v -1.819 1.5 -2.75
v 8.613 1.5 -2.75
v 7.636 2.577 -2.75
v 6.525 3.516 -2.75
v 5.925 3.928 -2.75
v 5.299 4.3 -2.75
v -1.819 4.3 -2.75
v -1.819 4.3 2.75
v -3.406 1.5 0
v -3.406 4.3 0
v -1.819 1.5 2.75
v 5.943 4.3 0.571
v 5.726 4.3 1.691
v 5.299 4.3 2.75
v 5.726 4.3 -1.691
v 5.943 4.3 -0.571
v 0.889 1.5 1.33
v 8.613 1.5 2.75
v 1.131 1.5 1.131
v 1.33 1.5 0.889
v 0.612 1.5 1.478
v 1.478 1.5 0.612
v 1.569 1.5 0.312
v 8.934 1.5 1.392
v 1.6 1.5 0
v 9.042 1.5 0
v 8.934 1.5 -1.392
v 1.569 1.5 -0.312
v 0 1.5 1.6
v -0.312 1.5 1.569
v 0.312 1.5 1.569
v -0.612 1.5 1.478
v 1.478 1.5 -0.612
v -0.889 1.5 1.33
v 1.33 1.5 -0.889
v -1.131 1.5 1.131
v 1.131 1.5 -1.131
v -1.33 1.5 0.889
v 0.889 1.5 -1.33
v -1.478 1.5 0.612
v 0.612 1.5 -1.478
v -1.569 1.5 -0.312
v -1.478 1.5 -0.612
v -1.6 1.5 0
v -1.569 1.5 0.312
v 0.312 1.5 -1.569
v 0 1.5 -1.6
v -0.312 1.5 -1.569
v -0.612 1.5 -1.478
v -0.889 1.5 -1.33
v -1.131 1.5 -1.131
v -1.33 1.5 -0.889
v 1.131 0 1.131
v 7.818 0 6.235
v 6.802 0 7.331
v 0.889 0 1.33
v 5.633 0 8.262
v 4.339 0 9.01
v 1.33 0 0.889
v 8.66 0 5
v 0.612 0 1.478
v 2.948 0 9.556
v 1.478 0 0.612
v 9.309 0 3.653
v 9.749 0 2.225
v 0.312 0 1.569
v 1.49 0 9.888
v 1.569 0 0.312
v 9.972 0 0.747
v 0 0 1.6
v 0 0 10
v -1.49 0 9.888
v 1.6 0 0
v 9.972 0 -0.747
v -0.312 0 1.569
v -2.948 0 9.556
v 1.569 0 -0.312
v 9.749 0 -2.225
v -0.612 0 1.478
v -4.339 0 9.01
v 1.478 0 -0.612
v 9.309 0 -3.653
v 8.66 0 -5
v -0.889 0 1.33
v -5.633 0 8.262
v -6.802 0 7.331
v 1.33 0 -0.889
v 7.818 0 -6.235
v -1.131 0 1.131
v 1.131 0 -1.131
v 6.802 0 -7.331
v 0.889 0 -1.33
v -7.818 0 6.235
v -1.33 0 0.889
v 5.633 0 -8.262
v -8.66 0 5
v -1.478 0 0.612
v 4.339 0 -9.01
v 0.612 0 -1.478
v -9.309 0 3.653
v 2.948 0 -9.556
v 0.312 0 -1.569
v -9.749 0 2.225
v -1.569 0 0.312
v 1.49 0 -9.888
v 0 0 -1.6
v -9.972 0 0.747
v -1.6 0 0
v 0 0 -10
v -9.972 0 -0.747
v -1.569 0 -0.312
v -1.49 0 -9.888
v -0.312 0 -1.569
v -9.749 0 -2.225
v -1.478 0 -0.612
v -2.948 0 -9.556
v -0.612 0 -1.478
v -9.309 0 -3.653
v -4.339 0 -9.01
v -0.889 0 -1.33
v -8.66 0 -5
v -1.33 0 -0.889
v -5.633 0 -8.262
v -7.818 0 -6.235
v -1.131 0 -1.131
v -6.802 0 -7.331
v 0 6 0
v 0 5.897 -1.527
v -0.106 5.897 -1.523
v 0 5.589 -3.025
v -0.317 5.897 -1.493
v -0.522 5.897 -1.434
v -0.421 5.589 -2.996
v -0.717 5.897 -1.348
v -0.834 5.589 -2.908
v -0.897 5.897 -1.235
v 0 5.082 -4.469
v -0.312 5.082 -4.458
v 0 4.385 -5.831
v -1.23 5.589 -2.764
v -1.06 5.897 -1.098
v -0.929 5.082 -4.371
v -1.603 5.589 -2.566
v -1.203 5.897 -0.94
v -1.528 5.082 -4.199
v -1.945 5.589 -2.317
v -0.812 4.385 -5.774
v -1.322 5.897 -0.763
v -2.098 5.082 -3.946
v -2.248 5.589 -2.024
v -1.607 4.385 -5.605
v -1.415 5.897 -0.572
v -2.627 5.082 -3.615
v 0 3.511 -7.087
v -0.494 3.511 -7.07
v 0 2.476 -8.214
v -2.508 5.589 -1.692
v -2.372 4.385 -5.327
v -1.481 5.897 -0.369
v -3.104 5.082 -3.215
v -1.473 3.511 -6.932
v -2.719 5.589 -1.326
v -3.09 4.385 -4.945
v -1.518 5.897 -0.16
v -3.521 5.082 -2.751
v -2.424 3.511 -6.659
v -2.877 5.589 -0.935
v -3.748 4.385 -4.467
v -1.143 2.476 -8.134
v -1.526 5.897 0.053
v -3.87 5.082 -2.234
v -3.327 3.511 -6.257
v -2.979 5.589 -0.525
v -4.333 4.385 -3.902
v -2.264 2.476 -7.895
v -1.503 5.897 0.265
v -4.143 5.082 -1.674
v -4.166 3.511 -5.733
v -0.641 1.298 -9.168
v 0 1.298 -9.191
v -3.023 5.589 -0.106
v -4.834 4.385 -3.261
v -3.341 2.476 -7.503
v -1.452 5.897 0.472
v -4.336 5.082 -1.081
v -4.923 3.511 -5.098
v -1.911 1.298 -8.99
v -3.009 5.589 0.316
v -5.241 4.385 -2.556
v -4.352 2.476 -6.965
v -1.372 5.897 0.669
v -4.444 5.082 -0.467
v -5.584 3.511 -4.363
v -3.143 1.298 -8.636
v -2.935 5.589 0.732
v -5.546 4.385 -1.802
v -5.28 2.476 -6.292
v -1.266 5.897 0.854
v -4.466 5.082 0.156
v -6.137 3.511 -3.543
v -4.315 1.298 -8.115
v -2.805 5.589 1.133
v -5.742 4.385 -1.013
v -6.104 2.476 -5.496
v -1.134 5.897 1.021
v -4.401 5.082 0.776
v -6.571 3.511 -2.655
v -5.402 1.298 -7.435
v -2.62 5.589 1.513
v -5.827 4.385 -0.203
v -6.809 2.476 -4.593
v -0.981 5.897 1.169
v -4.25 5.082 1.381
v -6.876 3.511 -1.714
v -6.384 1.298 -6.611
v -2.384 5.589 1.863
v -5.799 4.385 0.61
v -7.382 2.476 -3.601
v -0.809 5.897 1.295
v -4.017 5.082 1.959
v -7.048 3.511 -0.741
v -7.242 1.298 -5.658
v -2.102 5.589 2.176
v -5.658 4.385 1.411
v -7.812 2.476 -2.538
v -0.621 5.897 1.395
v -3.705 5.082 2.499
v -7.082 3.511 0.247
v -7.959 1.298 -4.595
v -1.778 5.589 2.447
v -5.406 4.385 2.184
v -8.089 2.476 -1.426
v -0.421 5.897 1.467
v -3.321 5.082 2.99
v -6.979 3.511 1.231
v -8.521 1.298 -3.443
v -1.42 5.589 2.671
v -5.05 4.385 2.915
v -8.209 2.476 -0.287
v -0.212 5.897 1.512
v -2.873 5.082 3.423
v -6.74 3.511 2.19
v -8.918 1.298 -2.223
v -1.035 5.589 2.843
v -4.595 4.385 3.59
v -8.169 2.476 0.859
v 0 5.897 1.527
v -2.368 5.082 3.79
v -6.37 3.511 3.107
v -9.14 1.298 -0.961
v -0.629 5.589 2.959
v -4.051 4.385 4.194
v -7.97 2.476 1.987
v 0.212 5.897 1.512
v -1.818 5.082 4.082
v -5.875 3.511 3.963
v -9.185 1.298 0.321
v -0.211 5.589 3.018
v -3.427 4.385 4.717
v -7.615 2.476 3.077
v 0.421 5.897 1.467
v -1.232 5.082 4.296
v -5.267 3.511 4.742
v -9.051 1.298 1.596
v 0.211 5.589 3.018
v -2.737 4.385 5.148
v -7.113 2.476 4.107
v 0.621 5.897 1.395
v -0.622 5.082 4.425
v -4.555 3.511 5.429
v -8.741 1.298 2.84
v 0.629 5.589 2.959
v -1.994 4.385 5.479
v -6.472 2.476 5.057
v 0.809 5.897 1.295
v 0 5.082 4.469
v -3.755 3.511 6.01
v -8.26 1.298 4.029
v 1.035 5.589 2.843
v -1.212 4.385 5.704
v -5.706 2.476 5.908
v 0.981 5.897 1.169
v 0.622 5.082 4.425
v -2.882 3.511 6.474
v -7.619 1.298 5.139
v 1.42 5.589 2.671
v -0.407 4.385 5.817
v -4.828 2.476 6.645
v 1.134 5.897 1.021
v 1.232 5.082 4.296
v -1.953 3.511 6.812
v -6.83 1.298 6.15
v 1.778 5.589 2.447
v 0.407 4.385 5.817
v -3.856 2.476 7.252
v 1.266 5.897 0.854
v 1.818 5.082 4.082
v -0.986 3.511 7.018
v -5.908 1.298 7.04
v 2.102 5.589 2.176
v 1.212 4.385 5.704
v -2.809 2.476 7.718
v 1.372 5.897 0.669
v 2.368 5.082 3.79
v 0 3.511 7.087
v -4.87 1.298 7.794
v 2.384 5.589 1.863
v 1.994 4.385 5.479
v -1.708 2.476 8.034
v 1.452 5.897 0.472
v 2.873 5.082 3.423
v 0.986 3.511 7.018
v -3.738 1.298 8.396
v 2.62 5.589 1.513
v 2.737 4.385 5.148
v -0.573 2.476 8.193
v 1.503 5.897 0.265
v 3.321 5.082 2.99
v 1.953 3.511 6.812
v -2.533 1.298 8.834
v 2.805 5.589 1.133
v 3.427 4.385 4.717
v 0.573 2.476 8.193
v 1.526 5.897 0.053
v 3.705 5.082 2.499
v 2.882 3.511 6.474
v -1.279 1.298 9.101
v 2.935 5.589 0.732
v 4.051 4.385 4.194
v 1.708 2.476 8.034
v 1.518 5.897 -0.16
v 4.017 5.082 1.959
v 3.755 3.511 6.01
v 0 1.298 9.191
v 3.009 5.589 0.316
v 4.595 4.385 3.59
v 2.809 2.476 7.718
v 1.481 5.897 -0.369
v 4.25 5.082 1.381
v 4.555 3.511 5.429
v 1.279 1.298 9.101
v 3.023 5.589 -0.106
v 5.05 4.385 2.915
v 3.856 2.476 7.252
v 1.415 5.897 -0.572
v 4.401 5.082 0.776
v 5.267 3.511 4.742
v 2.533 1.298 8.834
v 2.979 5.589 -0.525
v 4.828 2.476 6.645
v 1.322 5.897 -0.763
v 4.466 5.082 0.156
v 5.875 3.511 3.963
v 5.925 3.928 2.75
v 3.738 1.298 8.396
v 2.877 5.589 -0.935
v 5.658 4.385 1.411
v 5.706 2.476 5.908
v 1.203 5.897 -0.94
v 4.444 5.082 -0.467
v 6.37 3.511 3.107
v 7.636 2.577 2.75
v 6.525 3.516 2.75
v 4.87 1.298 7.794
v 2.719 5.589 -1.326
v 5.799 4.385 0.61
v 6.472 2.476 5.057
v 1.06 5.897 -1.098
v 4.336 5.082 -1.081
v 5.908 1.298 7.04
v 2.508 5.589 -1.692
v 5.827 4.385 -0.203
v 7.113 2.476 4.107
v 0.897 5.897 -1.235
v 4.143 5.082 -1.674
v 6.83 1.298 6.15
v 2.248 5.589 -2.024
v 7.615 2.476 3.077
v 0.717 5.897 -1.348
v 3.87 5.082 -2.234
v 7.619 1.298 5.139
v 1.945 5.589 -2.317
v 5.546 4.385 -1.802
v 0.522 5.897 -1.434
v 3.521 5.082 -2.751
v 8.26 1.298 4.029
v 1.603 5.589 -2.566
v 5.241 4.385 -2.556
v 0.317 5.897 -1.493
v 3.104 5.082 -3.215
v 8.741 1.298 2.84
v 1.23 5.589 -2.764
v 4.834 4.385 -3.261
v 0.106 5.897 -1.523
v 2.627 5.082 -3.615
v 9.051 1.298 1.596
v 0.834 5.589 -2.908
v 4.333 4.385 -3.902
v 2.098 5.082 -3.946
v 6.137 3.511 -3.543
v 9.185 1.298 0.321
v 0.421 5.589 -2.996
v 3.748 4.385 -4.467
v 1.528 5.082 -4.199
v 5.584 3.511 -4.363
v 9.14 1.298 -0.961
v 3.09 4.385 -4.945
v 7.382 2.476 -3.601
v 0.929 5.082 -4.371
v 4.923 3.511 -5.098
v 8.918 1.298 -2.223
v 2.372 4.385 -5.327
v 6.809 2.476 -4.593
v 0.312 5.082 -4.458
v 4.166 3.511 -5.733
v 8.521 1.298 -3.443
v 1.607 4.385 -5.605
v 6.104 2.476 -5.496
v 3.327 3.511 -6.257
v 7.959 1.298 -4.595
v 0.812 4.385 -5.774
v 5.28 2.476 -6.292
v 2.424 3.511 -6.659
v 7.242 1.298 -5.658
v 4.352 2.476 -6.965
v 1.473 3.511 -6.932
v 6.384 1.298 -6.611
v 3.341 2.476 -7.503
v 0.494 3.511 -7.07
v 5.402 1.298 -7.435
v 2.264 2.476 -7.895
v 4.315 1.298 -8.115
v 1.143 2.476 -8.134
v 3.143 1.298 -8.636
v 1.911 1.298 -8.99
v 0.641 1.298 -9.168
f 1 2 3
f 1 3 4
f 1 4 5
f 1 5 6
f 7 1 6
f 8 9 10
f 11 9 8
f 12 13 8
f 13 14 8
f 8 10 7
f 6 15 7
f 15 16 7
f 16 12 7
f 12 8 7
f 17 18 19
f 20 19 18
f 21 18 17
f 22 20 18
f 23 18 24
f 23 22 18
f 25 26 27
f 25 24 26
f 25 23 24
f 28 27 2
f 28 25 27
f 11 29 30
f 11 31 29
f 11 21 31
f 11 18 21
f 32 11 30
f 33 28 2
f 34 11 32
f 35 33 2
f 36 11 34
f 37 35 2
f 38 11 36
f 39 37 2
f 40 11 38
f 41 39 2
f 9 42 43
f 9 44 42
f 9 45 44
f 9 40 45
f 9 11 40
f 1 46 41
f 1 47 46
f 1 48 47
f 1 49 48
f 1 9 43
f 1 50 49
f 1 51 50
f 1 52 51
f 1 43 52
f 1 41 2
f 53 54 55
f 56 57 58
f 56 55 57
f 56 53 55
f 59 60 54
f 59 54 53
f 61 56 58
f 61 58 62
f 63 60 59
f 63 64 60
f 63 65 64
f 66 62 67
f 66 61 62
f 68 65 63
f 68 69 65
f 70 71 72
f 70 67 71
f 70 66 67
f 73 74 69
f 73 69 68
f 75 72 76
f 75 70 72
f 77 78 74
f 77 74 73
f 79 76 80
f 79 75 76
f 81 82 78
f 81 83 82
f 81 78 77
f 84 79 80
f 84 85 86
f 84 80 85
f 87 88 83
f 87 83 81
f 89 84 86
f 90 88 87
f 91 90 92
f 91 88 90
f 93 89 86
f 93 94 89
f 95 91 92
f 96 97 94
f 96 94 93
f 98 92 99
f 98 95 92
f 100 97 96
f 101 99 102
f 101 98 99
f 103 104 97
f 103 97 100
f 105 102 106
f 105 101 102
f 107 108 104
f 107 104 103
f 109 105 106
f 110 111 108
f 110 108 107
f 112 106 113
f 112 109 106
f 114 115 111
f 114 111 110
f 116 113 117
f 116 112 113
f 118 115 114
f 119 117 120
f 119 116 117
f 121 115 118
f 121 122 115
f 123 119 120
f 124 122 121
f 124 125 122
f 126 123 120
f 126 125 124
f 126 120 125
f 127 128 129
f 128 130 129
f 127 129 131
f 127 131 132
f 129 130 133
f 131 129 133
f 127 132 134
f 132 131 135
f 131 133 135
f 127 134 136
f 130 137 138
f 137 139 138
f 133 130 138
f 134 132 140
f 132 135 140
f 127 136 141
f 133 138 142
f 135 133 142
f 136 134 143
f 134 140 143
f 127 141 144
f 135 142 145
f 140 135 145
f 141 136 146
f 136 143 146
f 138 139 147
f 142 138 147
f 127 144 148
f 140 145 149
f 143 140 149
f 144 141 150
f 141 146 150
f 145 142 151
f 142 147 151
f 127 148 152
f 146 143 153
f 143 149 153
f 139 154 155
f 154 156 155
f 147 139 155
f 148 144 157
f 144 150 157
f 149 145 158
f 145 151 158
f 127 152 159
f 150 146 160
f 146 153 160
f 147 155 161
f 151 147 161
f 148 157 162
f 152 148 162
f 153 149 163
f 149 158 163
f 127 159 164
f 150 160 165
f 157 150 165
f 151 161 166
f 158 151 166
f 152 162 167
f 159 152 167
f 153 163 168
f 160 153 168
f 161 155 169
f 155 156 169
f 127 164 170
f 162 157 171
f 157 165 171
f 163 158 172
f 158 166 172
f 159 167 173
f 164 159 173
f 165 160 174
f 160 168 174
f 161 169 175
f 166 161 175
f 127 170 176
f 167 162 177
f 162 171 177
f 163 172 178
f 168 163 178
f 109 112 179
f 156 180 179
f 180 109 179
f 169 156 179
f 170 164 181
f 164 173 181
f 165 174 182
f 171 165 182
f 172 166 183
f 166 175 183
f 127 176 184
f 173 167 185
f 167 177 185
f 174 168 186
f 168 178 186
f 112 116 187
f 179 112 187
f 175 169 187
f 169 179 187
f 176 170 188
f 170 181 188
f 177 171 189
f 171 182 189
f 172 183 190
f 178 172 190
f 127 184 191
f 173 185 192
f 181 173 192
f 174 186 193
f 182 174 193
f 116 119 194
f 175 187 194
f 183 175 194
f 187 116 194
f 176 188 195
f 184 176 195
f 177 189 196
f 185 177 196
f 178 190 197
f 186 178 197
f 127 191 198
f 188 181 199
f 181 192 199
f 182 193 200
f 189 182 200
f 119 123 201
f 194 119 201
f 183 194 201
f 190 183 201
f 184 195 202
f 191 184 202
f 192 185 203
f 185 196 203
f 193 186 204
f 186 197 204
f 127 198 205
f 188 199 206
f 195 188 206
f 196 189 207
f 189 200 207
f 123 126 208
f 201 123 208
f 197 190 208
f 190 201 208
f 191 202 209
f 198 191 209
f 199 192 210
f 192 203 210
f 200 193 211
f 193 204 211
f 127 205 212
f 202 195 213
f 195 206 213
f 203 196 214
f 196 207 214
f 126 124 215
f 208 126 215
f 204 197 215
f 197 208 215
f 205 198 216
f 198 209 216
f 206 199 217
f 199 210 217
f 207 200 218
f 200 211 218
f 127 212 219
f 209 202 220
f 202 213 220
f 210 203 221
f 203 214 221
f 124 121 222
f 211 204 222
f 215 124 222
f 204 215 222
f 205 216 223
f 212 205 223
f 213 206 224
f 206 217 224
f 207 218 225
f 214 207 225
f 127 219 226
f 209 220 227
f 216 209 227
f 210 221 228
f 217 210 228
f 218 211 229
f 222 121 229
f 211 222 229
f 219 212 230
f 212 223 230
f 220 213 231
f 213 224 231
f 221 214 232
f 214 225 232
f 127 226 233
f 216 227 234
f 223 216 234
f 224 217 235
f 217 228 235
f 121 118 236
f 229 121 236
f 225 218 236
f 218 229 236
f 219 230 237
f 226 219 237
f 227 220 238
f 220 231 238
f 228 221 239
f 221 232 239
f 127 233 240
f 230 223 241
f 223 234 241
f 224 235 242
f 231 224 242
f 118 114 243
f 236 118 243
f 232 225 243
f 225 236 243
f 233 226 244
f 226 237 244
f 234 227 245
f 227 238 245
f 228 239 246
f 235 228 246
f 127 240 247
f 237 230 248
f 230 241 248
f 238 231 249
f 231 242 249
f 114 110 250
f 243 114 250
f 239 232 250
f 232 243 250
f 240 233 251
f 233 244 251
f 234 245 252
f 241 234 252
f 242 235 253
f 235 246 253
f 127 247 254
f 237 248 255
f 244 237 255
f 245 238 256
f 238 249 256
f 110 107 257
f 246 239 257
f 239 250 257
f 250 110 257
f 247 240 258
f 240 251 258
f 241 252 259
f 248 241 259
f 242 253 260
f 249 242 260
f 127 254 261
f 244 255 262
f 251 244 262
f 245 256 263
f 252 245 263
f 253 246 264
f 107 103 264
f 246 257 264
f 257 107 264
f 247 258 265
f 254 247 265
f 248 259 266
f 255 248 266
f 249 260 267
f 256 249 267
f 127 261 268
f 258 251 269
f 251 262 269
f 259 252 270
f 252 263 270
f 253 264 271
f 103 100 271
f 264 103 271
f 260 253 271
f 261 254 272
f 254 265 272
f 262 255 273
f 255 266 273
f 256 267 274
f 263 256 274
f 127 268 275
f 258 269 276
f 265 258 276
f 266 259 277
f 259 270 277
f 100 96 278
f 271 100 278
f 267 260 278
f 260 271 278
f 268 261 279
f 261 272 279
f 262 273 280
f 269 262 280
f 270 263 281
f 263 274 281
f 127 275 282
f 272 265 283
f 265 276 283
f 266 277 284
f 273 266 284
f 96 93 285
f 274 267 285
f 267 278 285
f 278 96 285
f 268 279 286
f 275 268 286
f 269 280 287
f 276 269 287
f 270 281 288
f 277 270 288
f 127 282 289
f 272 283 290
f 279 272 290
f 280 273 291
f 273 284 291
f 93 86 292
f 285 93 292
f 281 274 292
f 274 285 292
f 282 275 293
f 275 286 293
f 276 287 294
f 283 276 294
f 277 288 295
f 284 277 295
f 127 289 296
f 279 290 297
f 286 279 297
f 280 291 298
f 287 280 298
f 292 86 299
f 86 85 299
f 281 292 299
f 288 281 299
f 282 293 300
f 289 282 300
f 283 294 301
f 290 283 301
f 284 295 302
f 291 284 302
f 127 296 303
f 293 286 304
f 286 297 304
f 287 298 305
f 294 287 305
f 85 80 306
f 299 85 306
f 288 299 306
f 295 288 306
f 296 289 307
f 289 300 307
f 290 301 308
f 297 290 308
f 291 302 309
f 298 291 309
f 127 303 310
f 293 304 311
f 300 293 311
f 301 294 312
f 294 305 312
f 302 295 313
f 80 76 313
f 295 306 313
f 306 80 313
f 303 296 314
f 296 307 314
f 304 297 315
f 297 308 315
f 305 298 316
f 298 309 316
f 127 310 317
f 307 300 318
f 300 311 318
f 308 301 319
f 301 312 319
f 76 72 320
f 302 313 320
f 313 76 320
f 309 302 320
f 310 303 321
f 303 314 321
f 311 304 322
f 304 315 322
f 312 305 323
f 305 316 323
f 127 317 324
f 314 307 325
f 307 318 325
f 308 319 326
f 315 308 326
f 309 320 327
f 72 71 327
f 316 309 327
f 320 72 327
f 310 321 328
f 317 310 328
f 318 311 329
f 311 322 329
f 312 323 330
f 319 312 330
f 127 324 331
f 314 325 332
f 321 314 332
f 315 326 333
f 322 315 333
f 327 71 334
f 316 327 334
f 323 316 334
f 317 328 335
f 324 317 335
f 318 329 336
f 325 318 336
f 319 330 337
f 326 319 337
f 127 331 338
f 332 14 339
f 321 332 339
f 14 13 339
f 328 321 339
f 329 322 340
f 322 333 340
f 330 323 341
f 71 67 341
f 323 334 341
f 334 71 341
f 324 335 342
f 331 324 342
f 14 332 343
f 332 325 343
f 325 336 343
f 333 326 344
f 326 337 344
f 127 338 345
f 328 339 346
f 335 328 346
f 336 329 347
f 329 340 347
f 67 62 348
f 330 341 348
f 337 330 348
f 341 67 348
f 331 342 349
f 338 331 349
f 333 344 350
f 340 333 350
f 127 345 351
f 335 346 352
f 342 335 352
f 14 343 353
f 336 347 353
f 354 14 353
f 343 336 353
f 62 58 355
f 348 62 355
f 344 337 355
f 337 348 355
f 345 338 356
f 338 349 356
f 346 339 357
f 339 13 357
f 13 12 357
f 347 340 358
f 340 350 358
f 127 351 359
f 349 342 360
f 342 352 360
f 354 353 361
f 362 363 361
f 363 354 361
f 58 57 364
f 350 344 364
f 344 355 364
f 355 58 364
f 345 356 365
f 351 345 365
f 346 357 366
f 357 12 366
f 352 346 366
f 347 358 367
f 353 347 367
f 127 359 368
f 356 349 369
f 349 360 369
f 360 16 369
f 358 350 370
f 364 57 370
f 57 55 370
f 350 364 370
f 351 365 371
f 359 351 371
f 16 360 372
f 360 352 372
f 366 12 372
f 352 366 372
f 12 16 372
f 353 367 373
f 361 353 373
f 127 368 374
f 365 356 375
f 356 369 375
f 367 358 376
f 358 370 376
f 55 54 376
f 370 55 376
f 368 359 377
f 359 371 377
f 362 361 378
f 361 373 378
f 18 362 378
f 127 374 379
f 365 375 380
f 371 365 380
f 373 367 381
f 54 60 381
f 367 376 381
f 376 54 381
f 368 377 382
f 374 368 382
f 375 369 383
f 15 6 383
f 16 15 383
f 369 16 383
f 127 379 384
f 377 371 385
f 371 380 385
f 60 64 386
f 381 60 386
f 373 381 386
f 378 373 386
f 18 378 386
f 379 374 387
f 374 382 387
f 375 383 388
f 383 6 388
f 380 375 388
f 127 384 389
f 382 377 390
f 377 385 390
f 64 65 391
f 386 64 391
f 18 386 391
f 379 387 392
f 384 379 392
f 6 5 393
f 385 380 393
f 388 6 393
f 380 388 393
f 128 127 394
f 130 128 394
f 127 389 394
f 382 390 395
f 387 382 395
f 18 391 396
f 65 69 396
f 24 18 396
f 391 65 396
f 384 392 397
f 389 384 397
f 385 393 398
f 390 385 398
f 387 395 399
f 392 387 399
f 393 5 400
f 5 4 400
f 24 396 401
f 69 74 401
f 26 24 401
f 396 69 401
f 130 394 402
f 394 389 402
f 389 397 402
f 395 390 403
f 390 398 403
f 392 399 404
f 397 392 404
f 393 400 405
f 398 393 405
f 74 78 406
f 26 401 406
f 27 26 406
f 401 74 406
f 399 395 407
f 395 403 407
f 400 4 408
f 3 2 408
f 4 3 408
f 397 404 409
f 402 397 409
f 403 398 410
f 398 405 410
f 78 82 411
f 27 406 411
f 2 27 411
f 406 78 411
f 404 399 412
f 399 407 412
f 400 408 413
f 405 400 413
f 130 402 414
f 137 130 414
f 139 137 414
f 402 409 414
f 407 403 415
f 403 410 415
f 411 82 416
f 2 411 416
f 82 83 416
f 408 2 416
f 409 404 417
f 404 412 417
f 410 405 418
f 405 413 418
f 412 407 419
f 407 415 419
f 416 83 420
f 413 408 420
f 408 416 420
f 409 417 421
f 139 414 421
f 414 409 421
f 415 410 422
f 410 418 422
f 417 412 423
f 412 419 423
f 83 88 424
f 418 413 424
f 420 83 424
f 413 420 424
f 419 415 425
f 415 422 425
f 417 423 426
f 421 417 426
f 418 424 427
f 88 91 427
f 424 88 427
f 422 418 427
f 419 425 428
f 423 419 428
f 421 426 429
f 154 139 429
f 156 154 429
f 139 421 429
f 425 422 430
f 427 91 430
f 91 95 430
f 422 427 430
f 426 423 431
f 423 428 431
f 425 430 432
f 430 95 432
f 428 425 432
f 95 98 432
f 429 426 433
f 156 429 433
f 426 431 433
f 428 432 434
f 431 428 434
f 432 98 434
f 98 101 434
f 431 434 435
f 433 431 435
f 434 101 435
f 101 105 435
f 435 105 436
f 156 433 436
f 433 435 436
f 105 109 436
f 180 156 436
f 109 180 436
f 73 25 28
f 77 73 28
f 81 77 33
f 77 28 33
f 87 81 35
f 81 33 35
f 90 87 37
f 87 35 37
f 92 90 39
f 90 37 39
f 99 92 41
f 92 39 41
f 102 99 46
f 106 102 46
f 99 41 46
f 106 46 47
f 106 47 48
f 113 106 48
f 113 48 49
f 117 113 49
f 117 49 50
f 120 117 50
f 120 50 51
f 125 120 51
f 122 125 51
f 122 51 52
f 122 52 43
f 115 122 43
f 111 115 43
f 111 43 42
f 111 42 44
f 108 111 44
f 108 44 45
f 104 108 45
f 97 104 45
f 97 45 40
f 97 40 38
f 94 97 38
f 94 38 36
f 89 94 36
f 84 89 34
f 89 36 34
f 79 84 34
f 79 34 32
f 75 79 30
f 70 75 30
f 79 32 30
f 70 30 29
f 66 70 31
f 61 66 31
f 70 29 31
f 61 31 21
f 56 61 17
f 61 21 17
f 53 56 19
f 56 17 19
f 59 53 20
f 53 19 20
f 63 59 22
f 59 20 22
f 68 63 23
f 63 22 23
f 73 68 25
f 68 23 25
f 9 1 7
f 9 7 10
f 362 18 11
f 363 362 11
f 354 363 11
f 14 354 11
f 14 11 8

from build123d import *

# Parameters (mm, degrees)
CUT_EXTRUDE1_DEPTH       = 16.362291496
CUT_EXTRUDE1_DEPTH_BACK  = 5
SKETCH2_W                = 5.5
SKETCH2_H                = 2.8
M3_CLEARANCE_HOLE1_D     = 3.2
M3_CLEARANCE_HOLE1_DEPTH = 1.5
BOSS_EXTRUDE1_DEPTH      = 4.3


with BuildPart() as part:
    # Sketch1 → Revolve1 (revolve)
    with BuildSketch(Plane(origin=(0, 0, 0), x_dir=(0, 0, -1), z_dir=(1, 0, 0))):
        with BuildLine():
            Line((0, 0), (0, 6))
            ThreePointArc((0, 6), (5.830951895, 4.384919825), (10, 0))
            Line((10, 0), (0, 0))
        make_face()
    revolve(axis=Axis((0, 0, 0), (0, 1, 0)))

    # Sketch2 → Cut-Extrude1 (cut, two sides: drawn at the far end of the back side and taken through both)
    with BuildSketch(Plane(origin=(0, 0, 0), x_dir=(0, 0, -1), z_dir=(1, 0, 0)).offset(-CUT_EXTRUDE1_DEPTH_BACK)):
        with Locations((0, 2.9)):
            Rectangle(SKETCH2_W, SKETCH2_H)
    extrude(amount=CUT_EXTRUDE1_DEPTH + CUT_EXTRUDE1_DEPTH_BACK, mode=Mode.SUBTRACT)

    # M3 Clearance Hole1
    with Locations(Plane(origin=(0, 0, 0), x_dir=(-1, 0, 0), z_dir=(0, -1, 0))):
        with Locations((0, 0)):
            Hole(M3_CLEARANCE_HOLE1_D / 2, depth=M3_CLEARANCE_HOLE1_DEPTH)

    # Sketch11 → Boss-Extrude1 (add)
    with BuildSketch(Plane(origin=(0, 0, 0), x_dir=(1, 0, 0), z_dir=(0, 1, 0))):
        with BuildLine():
            Line((5.29913515, 2.75), (-1.703183294, 2.95))
            Line((-1.703183294, 2.95), (-3.406366588, 0))
            Line((-3.406366588, 0), (-1.703183294, -2.95))
            Line((-1.703183294, -2.95), (5.29913515, -2.75))
            ThreePointArc((5.29913515, -2.75), (-5.970203793, 0), (5.29913515, 2.75))
        make_face()
    extrude(amount=BOSS_EXTRUDE1_DEPTH)


solid = part.part
